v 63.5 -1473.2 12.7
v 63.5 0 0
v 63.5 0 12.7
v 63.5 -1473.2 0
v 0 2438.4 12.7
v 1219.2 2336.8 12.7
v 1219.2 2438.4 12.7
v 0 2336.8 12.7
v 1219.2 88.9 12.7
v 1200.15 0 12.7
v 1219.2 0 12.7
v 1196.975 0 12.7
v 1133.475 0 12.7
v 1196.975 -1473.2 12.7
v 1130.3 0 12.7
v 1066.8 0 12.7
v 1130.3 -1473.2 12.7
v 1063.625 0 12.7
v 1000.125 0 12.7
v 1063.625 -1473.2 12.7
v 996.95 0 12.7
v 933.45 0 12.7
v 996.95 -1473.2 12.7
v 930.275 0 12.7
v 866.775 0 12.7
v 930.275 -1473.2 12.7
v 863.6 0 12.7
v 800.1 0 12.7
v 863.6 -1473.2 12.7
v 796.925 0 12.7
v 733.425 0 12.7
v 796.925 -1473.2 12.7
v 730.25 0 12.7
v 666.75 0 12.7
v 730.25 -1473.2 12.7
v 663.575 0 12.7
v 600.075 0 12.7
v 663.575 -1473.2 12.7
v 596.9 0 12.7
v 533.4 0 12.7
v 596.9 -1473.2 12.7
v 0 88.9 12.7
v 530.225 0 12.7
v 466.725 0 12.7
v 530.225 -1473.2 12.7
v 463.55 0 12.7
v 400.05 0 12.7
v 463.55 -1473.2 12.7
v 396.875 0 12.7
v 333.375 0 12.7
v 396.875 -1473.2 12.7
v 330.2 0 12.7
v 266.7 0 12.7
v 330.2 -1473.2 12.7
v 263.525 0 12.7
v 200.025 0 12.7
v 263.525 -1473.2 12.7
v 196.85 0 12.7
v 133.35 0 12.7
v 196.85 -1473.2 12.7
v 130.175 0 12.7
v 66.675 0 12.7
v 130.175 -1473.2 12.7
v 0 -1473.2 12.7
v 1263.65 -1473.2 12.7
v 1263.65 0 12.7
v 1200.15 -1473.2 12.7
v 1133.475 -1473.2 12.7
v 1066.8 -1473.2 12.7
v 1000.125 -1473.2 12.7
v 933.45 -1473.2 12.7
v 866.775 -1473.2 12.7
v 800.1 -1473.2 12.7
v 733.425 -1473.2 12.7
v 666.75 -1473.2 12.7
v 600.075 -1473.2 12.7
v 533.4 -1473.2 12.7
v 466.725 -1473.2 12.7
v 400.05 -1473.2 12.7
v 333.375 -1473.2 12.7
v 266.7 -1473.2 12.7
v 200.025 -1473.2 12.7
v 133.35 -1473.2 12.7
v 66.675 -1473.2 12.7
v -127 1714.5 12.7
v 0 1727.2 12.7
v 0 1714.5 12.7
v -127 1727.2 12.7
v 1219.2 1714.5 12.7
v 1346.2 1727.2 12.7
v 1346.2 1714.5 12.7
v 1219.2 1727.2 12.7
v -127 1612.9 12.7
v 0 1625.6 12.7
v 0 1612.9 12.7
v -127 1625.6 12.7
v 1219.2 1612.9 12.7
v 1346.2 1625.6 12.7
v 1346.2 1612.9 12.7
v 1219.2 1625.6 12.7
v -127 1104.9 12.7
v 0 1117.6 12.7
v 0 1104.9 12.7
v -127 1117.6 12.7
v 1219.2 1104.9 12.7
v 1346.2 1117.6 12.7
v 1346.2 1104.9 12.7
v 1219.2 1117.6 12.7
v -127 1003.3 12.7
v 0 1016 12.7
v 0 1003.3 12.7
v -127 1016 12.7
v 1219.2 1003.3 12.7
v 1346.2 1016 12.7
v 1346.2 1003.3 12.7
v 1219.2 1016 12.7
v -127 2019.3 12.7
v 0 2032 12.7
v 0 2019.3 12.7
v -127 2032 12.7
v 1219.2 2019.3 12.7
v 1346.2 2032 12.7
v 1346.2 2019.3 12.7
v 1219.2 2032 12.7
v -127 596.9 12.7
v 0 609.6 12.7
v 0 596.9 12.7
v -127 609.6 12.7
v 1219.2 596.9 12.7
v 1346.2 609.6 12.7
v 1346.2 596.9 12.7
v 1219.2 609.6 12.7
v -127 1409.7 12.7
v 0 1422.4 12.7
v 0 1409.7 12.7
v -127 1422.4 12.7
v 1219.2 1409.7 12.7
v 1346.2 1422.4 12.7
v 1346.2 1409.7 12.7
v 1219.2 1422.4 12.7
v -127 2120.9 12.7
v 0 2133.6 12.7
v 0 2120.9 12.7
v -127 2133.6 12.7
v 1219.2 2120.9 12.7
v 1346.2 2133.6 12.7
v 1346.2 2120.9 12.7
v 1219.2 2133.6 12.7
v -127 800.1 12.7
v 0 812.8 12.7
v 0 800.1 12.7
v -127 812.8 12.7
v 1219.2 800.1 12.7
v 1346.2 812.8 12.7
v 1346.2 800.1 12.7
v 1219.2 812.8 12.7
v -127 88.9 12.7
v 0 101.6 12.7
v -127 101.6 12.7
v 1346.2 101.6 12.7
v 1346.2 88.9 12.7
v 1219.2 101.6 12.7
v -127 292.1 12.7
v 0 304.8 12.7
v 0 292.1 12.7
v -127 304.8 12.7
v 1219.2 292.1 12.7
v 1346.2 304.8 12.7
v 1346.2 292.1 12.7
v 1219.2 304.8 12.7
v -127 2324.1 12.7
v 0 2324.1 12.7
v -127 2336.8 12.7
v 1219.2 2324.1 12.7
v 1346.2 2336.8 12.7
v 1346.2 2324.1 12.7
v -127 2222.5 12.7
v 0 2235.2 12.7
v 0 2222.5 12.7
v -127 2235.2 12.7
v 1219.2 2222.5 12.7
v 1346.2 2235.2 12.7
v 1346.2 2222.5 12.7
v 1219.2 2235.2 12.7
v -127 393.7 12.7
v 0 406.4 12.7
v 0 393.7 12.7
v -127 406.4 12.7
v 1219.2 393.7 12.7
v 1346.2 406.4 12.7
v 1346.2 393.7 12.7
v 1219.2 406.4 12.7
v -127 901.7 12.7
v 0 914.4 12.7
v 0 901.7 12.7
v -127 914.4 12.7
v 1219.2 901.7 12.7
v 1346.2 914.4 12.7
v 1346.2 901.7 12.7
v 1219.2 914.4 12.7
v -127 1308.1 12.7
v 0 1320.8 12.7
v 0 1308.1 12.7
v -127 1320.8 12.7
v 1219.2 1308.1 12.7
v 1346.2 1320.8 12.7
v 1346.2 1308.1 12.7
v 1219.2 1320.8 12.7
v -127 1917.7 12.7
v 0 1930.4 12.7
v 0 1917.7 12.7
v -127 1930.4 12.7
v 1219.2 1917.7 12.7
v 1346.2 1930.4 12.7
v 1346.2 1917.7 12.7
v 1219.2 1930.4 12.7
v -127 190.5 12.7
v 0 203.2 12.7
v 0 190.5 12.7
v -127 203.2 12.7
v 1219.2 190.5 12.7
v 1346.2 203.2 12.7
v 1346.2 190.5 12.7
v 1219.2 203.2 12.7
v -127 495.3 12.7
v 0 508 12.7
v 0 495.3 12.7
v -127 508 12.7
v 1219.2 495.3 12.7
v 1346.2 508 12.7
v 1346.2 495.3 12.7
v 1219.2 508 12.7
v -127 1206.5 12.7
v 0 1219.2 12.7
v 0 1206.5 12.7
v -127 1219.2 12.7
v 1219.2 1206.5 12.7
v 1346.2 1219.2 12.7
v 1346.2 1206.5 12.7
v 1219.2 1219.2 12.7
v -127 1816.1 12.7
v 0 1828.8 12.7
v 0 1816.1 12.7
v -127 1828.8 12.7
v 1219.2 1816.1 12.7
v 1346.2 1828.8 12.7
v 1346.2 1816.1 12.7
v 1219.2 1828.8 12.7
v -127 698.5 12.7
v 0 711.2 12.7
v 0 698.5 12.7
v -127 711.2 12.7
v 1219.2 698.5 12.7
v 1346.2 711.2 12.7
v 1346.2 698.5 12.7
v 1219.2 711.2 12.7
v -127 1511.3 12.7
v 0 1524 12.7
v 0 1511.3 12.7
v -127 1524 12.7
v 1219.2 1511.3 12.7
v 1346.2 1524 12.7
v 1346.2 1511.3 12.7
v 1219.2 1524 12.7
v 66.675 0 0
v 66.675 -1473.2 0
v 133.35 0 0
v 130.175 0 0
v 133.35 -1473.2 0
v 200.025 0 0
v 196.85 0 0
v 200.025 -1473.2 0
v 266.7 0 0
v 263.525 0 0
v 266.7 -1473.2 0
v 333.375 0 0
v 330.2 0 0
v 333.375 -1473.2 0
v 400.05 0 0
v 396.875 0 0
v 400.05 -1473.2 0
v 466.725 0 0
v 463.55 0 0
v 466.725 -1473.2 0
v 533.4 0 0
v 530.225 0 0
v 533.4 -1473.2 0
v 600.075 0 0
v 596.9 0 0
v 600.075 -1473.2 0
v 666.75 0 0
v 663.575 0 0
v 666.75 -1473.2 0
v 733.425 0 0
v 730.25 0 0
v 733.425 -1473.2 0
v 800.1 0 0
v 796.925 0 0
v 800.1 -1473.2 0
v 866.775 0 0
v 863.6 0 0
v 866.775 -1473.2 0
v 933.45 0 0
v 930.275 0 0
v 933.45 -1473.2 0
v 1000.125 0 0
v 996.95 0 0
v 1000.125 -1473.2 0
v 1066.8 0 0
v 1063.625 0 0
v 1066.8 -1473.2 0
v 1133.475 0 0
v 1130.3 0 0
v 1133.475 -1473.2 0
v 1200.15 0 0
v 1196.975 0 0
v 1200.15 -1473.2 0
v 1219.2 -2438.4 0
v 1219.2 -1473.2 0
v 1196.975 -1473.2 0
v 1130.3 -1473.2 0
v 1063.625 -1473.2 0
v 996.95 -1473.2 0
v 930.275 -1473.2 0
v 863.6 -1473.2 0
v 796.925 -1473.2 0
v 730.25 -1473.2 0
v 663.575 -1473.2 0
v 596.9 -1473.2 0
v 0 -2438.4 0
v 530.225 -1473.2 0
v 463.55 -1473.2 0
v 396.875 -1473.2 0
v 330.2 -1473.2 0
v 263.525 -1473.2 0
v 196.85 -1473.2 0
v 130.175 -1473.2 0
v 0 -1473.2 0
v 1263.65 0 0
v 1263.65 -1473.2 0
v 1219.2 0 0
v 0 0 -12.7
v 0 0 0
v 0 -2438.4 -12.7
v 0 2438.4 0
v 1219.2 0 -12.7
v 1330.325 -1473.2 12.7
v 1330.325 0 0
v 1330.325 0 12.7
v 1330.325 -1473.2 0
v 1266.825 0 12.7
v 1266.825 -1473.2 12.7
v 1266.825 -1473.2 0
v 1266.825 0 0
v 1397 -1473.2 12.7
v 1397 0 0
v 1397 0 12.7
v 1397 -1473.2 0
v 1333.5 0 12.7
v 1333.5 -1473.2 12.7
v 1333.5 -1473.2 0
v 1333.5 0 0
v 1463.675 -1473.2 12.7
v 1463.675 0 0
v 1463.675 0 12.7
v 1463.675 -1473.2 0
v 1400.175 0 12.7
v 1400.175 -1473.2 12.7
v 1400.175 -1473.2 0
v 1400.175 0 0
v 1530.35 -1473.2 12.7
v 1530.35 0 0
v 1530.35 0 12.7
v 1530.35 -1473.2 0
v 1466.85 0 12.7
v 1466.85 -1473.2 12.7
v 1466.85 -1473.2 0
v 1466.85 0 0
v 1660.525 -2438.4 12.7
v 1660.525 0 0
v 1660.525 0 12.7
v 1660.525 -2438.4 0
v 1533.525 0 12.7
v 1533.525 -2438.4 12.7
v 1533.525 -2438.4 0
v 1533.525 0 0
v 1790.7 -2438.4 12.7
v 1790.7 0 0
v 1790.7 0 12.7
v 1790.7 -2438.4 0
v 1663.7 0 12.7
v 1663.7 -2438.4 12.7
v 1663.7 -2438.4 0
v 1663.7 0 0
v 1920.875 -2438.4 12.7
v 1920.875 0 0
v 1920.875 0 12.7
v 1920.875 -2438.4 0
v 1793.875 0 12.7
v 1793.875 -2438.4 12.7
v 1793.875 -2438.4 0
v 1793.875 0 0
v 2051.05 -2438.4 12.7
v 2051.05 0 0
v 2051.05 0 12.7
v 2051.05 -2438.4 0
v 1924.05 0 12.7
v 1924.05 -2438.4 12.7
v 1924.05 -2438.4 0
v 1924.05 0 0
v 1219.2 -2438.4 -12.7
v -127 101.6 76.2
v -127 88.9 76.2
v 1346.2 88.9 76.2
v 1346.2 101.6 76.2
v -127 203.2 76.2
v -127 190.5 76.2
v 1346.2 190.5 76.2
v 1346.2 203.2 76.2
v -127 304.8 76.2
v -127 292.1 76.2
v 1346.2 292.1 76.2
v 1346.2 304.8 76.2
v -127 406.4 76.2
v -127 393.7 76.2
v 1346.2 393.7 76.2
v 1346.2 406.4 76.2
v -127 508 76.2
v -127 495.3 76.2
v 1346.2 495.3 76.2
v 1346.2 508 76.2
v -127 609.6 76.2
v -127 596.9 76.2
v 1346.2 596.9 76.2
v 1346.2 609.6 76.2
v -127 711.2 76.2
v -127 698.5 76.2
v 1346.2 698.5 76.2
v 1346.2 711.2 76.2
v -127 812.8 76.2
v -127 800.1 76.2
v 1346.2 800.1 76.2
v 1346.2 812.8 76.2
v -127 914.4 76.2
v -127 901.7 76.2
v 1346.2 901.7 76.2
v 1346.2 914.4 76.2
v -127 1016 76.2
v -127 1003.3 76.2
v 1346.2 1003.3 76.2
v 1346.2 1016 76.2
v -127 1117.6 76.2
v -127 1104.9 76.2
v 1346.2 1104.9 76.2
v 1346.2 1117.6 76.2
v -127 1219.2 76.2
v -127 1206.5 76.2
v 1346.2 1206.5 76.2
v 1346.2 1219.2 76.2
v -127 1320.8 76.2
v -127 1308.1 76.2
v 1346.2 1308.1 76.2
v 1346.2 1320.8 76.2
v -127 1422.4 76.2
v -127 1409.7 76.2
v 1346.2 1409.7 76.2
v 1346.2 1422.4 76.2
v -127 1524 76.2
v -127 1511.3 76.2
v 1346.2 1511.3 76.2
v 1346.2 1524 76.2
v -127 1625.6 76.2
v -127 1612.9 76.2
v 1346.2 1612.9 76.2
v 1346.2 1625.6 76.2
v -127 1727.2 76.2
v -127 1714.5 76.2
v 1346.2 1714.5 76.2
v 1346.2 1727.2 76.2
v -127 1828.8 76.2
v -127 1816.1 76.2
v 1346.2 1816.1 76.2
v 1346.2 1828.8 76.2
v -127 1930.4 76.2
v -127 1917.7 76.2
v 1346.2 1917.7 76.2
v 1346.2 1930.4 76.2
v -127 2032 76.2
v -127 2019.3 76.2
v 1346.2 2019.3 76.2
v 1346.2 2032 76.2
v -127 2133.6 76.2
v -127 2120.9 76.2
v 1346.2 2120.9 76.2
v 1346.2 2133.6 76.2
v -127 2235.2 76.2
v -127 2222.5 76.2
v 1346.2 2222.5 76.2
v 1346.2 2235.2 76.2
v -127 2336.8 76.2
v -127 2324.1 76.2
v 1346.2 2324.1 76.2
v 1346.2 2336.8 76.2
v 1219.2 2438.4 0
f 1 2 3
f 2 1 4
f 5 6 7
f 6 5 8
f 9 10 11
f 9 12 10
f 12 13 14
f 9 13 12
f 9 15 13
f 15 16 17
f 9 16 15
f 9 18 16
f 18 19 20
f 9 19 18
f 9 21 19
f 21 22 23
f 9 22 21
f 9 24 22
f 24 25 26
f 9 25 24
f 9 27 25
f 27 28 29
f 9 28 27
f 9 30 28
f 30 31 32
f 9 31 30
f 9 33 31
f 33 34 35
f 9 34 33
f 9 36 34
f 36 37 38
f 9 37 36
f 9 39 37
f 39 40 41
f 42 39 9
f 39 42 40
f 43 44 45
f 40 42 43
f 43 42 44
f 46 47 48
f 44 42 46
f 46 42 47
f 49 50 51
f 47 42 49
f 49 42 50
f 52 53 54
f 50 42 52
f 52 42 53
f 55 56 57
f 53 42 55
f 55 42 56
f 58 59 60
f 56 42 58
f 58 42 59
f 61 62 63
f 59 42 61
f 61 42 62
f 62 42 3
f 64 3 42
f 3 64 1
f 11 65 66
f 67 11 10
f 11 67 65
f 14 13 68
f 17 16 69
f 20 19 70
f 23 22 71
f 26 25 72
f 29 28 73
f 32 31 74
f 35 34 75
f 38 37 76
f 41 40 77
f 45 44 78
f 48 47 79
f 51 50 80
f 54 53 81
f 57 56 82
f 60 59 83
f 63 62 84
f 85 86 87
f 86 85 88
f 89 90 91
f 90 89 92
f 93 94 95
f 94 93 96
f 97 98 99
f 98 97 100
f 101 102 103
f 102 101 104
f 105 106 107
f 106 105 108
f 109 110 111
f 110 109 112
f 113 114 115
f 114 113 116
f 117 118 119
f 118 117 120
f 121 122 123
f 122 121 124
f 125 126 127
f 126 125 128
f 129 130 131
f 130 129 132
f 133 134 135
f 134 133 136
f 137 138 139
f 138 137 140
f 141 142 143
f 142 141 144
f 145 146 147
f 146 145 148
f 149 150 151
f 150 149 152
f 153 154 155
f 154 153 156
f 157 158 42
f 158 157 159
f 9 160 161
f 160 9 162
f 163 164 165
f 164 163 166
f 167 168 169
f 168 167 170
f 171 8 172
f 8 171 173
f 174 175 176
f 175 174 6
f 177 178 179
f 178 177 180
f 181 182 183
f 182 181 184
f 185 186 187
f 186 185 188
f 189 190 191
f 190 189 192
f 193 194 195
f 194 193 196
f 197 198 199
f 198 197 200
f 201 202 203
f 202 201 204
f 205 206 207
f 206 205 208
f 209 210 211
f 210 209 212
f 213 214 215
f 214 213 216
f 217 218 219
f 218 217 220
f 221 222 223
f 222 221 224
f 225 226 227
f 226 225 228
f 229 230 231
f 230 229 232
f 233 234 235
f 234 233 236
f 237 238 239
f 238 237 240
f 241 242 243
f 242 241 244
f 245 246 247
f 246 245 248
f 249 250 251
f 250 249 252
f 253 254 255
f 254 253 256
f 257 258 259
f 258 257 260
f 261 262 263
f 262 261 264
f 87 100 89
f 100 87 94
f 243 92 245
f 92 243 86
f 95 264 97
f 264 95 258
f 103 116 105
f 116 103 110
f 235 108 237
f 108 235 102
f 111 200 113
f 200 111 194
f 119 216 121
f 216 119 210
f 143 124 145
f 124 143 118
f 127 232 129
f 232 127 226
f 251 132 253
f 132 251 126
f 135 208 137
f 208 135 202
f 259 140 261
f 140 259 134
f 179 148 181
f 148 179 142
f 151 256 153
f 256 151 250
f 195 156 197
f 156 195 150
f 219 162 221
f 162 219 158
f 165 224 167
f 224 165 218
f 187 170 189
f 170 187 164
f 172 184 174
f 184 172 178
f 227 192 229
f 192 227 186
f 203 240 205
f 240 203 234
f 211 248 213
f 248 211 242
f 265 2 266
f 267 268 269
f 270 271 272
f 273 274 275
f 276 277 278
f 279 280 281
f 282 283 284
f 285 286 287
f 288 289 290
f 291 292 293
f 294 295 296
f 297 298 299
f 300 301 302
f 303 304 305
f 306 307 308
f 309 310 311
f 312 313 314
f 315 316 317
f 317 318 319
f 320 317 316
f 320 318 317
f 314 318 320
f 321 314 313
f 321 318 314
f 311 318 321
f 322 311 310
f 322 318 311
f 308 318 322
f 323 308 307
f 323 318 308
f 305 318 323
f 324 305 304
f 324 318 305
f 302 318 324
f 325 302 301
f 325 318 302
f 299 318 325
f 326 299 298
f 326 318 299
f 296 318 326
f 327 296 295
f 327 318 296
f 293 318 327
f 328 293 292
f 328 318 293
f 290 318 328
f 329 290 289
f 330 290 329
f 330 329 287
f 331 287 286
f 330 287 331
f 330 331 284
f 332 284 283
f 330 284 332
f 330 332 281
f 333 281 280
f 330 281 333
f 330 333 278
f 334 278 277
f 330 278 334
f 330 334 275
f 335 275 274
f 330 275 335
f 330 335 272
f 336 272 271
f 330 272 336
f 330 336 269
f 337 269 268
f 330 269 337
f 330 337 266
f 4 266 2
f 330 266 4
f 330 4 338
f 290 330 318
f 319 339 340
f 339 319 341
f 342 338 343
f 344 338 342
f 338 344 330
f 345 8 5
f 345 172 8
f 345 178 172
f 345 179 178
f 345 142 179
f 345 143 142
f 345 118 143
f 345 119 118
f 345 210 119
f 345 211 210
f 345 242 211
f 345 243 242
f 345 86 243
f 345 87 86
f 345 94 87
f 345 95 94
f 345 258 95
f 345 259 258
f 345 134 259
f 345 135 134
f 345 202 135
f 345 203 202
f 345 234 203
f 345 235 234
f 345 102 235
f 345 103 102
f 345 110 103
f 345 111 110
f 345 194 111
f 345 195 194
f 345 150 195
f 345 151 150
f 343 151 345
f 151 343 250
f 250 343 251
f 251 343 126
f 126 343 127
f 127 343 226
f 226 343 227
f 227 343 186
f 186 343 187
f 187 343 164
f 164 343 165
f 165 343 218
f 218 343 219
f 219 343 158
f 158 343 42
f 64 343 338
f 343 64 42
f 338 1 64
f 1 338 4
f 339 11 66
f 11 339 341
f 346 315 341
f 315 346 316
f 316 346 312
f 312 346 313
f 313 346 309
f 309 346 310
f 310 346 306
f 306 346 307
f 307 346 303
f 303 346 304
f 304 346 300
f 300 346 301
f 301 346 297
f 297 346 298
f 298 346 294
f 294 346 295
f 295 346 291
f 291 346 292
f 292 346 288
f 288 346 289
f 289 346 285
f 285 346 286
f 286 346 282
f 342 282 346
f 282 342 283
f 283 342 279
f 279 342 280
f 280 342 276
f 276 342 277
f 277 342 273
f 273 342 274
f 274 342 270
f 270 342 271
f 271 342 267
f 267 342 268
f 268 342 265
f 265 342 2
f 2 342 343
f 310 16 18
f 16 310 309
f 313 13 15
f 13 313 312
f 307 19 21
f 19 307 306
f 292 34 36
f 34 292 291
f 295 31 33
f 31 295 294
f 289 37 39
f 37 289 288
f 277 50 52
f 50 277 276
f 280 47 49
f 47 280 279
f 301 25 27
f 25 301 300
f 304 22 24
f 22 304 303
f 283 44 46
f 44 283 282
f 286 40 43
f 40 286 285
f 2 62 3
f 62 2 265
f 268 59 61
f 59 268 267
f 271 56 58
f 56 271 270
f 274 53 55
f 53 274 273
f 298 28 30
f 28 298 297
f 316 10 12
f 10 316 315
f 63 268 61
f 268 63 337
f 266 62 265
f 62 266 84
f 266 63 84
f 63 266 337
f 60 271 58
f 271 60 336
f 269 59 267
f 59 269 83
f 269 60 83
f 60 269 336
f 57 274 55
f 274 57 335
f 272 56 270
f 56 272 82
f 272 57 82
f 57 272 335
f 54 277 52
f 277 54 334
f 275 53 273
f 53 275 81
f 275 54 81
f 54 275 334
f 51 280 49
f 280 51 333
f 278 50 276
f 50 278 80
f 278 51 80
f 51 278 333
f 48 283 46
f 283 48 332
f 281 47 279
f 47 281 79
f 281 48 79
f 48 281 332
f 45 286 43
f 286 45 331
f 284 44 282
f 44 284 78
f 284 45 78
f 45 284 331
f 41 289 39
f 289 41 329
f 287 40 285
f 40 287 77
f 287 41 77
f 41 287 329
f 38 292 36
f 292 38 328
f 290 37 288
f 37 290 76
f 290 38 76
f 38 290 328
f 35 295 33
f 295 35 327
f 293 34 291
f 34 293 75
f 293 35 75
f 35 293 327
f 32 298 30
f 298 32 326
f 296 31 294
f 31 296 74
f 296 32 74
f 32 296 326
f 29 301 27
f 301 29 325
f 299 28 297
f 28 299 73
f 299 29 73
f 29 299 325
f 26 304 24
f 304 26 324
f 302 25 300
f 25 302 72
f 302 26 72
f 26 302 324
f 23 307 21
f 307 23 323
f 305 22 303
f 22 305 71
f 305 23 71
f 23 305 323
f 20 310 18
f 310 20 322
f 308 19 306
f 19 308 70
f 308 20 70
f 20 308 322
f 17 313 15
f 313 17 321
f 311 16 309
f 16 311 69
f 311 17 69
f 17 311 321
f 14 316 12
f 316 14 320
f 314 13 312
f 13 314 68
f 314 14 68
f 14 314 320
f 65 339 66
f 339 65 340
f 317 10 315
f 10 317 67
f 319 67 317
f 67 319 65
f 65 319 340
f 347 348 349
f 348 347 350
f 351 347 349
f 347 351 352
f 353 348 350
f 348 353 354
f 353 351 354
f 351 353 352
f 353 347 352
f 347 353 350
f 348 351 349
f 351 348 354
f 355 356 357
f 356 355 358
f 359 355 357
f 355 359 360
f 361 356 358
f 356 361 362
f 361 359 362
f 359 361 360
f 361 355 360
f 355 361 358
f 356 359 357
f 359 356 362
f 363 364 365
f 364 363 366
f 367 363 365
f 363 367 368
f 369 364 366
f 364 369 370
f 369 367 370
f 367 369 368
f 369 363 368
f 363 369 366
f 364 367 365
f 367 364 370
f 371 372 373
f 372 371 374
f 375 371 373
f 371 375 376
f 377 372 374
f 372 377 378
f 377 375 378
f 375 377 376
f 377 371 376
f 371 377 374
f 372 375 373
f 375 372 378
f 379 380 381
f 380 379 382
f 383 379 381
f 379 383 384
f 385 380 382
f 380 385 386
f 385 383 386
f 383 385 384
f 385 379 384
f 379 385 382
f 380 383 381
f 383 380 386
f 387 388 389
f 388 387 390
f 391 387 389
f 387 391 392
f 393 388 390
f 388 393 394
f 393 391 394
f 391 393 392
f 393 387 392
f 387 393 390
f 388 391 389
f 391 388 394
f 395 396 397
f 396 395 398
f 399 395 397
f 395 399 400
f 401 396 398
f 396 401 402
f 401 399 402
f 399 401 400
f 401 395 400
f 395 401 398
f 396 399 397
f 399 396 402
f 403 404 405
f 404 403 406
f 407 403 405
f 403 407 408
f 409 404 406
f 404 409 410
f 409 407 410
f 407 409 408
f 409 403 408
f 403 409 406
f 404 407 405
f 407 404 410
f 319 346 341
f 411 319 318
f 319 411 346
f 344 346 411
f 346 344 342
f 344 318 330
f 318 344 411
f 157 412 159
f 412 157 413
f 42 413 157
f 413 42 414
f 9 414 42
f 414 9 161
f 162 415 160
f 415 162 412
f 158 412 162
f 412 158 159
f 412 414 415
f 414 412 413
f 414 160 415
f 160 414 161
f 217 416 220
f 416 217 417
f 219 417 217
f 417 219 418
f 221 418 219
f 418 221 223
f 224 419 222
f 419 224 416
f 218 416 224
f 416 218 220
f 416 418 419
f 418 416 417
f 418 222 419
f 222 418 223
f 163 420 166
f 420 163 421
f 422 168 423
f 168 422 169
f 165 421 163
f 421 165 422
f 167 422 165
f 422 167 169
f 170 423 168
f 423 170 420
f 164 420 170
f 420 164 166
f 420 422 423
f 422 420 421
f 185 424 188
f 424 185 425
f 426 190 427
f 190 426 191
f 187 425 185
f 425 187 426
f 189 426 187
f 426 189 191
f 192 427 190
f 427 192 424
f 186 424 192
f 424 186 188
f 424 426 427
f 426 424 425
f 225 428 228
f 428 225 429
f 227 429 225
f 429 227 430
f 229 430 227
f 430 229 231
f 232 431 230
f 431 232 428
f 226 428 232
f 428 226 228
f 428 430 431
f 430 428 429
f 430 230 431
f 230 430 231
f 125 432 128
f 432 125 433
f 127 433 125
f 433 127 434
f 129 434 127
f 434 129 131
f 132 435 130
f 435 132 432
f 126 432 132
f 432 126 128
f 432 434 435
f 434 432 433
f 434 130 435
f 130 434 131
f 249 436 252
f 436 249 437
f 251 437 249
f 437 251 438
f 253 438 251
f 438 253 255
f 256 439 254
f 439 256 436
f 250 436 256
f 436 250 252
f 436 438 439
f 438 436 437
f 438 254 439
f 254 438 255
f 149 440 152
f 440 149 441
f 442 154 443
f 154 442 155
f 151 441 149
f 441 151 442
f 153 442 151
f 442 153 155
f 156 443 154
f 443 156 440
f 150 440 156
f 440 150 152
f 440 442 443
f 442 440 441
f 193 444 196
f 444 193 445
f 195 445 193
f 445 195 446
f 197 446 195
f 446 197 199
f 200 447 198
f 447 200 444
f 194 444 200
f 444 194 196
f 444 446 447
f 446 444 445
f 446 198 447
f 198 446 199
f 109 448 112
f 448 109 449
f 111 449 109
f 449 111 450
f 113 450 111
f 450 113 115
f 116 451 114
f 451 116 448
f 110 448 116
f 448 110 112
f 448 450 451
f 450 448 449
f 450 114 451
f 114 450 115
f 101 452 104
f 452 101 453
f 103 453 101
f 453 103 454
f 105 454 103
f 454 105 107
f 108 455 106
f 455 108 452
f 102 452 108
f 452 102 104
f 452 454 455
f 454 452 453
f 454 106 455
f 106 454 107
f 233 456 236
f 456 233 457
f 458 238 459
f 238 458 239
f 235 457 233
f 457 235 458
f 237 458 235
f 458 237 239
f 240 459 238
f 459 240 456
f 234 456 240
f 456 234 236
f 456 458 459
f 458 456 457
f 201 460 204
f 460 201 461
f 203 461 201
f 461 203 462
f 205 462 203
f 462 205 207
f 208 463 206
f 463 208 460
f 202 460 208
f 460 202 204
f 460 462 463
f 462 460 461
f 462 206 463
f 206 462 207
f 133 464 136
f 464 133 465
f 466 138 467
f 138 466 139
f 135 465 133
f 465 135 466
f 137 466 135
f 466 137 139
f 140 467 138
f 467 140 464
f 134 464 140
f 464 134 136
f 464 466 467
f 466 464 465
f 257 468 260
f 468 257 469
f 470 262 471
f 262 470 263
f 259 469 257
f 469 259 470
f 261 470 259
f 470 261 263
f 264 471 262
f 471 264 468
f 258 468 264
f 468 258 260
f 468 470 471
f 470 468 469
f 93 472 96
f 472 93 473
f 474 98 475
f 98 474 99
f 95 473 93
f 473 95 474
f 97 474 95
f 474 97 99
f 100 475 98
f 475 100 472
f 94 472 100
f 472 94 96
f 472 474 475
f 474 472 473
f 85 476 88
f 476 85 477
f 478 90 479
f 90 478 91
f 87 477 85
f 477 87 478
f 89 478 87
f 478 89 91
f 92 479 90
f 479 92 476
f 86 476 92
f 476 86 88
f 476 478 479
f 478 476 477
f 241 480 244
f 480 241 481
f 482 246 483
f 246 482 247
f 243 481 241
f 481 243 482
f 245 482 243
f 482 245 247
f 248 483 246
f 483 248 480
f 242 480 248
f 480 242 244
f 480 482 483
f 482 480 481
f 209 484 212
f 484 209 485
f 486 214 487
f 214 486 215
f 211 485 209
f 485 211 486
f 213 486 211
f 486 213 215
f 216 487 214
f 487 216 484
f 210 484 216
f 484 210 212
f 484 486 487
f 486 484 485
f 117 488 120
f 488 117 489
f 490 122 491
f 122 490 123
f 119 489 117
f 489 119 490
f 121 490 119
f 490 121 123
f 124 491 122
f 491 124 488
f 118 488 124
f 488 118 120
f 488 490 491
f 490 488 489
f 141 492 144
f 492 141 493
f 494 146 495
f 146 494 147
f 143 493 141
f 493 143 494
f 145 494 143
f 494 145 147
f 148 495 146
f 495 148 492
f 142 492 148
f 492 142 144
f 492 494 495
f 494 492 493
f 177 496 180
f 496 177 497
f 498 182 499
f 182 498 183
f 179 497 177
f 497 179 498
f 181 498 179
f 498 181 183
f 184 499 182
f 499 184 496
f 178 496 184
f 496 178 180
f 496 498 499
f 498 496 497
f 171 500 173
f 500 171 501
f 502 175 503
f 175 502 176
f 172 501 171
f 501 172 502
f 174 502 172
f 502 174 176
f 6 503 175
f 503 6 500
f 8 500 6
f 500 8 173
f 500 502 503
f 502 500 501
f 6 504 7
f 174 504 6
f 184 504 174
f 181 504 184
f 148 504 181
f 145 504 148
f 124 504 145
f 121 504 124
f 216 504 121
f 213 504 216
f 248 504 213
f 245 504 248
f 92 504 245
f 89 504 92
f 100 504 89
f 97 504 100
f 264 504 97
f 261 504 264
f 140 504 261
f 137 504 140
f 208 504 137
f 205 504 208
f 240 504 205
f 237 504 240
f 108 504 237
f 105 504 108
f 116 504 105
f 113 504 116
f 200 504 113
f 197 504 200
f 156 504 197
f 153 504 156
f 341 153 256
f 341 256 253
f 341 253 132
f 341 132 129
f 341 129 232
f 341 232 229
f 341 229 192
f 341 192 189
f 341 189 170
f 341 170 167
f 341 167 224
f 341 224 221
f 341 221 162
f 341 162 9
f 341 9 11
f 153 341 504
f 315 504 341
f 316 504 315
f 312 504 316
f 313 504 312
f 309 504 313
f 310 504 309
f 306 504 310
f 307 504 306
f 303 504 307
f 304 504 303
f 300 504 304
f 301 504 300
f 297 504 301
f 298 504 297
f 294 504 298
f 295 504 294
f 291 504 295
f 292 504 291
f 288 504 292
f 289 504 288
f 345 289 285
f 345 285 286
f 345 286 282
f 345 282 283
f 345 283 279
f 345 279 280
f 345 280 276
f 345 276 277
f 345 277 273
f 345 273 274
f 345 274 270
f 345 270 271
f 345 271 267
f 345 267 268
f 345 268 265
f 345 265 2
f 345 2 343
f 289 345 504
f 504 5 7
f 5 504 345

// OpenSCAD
websize=inches(2.5);
webdist=inches(4);
ywebs=floor((feet(8)-1)/webdist);
echo(str("YWebs: ",ywebs,"*",websize,"=",(ywebs*(websize+inches(1/8))/inches(1))));
mirror([0,1]) {
  #translate([0,0,inches(-1/2)]) panel(4,8);
  for(y=[1:ywebs]) translate([(y-1)*(inches(1/8)+websize),0]) cube([websize,y>ywebs?feet(8):inches(58),inches(1/2)]);
  for(y=[1:4]) translate([ywebs*(inches(1/8)+websize)+((y-1)*inches(5.125)),0]) cube([inches(5),feet(8),inches(1/2)]);
}
panel(4,8);
%translate([0,0,inches(3.5)]) panel(4,8);
for(y=[1:ywebs]) translate([inches(-5),y*webdist,inches(1/2)]) rotate([90,0]) cube([inches(58),websize,inches(1/2)]);
module panel(wft,hft,d=inches(1/2))
{
  cube([feet(wft),feet(hft),d]);
}
function inches(in) = 25.4*in;
function feet(ft) = inches(ft*12);
